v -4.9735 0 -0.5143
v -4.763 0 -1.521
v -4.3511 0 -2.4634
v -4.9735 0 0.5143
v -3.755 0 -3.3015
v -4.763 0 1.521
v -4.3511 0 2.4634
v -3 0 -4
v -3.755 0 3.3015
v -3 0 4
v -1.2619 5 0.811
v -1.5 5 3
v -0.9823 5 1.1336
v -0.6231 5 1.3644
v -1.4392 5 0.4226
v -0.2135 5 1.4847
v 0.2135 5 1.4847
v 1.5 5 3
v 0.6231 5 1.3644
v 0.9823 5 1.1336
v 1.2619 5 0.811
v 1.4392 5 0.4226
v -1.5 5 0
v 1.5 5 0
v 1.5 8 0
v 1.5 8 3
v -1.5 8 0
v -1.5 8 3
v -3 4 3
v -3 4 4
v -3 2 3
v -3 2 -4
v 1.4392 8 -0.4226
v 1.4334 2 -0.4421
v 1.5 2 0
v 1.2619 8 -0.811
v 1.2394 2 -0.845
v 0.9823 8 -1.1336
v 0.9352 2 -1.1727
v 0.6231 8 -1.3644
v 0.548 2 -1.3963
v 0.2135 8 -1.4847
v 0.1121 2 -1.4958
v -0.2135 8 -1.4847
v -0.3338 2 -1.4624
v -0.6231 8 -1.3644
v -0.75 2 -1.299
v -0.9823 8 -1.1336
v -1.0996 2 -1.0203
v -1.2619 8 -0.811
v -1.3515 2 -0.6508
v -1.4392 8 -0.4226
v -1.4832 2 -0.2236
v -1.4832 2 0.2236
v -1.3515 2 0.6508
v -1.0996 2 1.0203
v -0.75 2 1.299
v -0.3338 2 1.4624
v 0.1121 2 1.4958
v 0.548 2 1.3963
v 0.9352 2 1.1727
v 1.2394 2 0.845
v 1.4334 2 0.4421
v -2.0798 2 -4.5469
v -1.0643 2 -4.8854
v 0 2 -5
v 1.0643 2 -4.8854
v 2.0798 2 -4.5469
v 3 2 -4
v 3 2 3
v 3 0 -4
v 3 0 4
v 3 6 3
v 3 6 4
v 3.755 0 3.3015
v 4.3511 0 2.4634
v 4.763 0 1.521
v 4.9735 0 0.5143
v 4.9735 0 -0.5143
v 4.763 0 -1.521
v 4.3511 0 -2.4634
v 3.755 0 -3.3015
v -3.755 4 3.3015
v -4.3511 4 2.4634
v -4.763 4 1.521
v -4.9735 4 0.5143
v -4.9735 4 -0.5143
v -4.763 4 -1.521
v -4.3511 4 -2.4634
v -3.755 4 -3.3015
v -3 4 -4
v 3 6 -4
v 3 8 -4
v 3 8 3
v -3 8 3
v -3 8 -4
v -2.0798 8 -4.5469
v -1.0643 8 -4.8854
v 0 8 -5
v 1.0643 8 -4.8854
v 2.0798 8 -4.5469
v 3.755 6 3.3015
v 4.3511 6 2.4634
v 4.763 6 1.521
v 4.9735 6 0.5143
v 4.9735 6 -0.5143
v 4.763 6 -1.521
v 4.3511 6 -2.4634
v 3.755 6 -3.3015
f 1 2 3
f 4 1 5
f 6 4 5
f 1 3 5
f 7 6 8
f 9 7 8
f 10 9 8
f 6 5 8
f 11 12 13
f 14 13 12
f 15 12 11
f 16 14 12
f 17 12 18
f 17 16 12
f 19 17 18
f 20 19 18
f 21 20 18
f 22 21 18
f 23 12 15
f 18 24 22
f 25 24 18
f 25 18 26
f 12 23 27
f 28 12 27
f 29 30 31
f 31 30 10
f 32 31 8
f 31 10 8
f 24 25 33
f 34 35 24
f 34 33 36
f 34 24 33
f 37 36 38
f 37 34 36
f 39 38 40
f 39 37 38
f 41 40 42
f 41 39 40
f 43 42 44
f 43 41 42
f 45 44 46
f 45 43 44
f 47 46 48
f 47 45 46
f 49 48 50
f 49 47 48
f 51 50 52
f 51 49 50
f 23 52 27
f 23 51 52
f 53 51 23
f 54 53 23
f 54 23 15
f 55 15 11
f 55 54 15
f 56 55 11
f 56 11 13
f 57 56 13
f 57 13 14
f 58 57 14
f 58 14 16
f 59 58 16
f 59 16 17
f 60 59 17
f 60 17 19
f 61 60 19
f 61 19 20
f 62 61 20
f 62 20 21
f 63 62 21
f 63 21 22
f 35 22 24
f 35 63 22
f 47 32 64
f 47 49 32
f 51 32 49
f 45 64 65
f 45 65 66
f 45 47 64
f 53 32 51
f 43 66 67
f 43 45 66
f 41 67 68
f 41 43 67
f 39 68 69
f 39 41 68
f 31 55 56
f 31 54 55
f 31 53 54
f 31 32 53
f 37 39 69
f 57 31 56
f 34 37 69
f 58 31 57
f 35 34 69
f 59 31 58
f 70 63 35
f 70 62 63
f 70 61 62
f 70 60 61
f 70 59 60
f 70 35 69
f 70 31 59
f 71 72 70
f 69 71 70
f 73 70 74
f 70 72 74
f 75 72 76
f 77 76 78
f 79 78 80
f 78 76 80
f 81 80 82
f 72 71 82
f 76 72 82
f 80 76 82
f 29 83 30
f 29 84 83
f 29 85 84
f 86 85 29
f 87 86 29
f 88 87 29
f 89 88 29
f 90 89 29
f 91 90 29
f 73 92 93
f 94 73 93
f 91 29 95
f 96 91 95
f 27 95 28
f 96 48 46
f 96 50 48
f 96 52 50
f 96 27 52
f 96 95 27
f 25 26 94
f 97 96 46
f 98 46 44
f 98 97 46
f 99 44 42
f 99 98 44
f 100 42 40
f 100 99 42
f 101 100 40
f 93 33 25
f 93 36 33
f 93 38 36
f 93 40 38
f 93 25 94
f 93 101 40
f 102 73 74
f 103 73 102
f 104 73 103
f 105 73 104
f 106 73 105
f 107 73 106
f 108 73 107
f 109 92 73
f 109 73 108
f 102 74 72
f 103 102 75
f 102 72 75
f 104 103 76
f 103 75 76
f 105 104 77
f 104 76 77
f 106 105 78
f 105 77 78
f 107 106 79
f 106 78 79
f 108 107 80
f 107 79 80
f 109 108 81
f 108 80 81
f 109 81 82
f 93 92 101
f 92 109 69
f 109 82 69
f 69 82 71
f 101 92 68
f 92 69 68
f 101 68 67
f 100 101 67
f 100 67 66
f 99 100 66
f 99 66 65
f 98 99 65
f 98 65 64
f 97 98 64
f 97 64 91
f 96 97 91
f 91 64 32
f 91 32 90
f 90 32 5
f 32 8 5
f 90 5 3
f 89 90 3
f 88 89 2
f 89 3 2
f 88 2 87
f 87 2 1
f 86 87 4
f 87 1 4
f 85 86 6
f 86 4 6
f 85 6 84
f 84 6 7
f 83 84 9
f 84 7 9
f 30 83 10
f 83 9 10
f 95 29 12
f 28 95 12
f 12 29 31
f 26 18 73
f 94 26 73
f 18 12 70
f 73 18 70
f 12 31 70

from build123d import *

# Parameters (mm, degrees)
SKETCH1_R           = 1.5
BOSS_EXTRUDE1_DEPTH = 8
SKETCH2_W           = 2
SKETCH2_H           = 2
SKETCH2_H_2         = 4
SKETCH2_W_2         = 6
CUT_EXTRUDE1_DEPTH  = 9
SKETCH3_W           = 3
SKETCH3_H           = 3
CUT_EXTRUDE2_DEPTH  = 18


with BuildPart() as part:
    # Sketch1 → Boss-Extrude1 (new body)
    with BuildSketch(Plane(origin=(0, 0, 0), x_dir=(1, 0, 0), z_dir=(0, 1, 0))):
        with BuildLine():
            Line((-3, -4), (-3, -3))
            Line((-3, -3), (3, -3))
            Line((3, -3), (3, -4))
            ThreePointArc((3, -4), (0, 5), (-3, -4))
        make_face()
        Circle(SKETCH1_R, mode=Mode.SUBTRACT)
    extrude(amount=BOSS_EXTRUDE1_DEPTH)

    # Sketch2 → Cut-Extrude1 (cut, symmetric)
    with BuildSketch(Plane.XY):
        with Locations((4, 7)):
            Rectangle(SKETCH2_W, SKETCH2_H)
        with Locations((-4, 6)):
            Rectangle(SKETCH2_W, SKETCH2_H_2)
        with Locations((0, 1)):
            Rectangle(SKETCH2_W_2, SKETCH2_H)
    extrude(amount=CUT_EXTRUDE1_DEPTH, both=True, mode=Mode.SUBTRACT)

    # Sketch3 → Cut-Extrude2 (cut)
    with BuildSketch(Plane.XY):
        with Locations((0, 6.5)):
            Rectangle(SKETCH3_W, SKETCH3_H)
    extrude(amount=CUT_EXTRUDE2_DEPTH, mode=Mode.SUBTRACT)


solid = part.part
